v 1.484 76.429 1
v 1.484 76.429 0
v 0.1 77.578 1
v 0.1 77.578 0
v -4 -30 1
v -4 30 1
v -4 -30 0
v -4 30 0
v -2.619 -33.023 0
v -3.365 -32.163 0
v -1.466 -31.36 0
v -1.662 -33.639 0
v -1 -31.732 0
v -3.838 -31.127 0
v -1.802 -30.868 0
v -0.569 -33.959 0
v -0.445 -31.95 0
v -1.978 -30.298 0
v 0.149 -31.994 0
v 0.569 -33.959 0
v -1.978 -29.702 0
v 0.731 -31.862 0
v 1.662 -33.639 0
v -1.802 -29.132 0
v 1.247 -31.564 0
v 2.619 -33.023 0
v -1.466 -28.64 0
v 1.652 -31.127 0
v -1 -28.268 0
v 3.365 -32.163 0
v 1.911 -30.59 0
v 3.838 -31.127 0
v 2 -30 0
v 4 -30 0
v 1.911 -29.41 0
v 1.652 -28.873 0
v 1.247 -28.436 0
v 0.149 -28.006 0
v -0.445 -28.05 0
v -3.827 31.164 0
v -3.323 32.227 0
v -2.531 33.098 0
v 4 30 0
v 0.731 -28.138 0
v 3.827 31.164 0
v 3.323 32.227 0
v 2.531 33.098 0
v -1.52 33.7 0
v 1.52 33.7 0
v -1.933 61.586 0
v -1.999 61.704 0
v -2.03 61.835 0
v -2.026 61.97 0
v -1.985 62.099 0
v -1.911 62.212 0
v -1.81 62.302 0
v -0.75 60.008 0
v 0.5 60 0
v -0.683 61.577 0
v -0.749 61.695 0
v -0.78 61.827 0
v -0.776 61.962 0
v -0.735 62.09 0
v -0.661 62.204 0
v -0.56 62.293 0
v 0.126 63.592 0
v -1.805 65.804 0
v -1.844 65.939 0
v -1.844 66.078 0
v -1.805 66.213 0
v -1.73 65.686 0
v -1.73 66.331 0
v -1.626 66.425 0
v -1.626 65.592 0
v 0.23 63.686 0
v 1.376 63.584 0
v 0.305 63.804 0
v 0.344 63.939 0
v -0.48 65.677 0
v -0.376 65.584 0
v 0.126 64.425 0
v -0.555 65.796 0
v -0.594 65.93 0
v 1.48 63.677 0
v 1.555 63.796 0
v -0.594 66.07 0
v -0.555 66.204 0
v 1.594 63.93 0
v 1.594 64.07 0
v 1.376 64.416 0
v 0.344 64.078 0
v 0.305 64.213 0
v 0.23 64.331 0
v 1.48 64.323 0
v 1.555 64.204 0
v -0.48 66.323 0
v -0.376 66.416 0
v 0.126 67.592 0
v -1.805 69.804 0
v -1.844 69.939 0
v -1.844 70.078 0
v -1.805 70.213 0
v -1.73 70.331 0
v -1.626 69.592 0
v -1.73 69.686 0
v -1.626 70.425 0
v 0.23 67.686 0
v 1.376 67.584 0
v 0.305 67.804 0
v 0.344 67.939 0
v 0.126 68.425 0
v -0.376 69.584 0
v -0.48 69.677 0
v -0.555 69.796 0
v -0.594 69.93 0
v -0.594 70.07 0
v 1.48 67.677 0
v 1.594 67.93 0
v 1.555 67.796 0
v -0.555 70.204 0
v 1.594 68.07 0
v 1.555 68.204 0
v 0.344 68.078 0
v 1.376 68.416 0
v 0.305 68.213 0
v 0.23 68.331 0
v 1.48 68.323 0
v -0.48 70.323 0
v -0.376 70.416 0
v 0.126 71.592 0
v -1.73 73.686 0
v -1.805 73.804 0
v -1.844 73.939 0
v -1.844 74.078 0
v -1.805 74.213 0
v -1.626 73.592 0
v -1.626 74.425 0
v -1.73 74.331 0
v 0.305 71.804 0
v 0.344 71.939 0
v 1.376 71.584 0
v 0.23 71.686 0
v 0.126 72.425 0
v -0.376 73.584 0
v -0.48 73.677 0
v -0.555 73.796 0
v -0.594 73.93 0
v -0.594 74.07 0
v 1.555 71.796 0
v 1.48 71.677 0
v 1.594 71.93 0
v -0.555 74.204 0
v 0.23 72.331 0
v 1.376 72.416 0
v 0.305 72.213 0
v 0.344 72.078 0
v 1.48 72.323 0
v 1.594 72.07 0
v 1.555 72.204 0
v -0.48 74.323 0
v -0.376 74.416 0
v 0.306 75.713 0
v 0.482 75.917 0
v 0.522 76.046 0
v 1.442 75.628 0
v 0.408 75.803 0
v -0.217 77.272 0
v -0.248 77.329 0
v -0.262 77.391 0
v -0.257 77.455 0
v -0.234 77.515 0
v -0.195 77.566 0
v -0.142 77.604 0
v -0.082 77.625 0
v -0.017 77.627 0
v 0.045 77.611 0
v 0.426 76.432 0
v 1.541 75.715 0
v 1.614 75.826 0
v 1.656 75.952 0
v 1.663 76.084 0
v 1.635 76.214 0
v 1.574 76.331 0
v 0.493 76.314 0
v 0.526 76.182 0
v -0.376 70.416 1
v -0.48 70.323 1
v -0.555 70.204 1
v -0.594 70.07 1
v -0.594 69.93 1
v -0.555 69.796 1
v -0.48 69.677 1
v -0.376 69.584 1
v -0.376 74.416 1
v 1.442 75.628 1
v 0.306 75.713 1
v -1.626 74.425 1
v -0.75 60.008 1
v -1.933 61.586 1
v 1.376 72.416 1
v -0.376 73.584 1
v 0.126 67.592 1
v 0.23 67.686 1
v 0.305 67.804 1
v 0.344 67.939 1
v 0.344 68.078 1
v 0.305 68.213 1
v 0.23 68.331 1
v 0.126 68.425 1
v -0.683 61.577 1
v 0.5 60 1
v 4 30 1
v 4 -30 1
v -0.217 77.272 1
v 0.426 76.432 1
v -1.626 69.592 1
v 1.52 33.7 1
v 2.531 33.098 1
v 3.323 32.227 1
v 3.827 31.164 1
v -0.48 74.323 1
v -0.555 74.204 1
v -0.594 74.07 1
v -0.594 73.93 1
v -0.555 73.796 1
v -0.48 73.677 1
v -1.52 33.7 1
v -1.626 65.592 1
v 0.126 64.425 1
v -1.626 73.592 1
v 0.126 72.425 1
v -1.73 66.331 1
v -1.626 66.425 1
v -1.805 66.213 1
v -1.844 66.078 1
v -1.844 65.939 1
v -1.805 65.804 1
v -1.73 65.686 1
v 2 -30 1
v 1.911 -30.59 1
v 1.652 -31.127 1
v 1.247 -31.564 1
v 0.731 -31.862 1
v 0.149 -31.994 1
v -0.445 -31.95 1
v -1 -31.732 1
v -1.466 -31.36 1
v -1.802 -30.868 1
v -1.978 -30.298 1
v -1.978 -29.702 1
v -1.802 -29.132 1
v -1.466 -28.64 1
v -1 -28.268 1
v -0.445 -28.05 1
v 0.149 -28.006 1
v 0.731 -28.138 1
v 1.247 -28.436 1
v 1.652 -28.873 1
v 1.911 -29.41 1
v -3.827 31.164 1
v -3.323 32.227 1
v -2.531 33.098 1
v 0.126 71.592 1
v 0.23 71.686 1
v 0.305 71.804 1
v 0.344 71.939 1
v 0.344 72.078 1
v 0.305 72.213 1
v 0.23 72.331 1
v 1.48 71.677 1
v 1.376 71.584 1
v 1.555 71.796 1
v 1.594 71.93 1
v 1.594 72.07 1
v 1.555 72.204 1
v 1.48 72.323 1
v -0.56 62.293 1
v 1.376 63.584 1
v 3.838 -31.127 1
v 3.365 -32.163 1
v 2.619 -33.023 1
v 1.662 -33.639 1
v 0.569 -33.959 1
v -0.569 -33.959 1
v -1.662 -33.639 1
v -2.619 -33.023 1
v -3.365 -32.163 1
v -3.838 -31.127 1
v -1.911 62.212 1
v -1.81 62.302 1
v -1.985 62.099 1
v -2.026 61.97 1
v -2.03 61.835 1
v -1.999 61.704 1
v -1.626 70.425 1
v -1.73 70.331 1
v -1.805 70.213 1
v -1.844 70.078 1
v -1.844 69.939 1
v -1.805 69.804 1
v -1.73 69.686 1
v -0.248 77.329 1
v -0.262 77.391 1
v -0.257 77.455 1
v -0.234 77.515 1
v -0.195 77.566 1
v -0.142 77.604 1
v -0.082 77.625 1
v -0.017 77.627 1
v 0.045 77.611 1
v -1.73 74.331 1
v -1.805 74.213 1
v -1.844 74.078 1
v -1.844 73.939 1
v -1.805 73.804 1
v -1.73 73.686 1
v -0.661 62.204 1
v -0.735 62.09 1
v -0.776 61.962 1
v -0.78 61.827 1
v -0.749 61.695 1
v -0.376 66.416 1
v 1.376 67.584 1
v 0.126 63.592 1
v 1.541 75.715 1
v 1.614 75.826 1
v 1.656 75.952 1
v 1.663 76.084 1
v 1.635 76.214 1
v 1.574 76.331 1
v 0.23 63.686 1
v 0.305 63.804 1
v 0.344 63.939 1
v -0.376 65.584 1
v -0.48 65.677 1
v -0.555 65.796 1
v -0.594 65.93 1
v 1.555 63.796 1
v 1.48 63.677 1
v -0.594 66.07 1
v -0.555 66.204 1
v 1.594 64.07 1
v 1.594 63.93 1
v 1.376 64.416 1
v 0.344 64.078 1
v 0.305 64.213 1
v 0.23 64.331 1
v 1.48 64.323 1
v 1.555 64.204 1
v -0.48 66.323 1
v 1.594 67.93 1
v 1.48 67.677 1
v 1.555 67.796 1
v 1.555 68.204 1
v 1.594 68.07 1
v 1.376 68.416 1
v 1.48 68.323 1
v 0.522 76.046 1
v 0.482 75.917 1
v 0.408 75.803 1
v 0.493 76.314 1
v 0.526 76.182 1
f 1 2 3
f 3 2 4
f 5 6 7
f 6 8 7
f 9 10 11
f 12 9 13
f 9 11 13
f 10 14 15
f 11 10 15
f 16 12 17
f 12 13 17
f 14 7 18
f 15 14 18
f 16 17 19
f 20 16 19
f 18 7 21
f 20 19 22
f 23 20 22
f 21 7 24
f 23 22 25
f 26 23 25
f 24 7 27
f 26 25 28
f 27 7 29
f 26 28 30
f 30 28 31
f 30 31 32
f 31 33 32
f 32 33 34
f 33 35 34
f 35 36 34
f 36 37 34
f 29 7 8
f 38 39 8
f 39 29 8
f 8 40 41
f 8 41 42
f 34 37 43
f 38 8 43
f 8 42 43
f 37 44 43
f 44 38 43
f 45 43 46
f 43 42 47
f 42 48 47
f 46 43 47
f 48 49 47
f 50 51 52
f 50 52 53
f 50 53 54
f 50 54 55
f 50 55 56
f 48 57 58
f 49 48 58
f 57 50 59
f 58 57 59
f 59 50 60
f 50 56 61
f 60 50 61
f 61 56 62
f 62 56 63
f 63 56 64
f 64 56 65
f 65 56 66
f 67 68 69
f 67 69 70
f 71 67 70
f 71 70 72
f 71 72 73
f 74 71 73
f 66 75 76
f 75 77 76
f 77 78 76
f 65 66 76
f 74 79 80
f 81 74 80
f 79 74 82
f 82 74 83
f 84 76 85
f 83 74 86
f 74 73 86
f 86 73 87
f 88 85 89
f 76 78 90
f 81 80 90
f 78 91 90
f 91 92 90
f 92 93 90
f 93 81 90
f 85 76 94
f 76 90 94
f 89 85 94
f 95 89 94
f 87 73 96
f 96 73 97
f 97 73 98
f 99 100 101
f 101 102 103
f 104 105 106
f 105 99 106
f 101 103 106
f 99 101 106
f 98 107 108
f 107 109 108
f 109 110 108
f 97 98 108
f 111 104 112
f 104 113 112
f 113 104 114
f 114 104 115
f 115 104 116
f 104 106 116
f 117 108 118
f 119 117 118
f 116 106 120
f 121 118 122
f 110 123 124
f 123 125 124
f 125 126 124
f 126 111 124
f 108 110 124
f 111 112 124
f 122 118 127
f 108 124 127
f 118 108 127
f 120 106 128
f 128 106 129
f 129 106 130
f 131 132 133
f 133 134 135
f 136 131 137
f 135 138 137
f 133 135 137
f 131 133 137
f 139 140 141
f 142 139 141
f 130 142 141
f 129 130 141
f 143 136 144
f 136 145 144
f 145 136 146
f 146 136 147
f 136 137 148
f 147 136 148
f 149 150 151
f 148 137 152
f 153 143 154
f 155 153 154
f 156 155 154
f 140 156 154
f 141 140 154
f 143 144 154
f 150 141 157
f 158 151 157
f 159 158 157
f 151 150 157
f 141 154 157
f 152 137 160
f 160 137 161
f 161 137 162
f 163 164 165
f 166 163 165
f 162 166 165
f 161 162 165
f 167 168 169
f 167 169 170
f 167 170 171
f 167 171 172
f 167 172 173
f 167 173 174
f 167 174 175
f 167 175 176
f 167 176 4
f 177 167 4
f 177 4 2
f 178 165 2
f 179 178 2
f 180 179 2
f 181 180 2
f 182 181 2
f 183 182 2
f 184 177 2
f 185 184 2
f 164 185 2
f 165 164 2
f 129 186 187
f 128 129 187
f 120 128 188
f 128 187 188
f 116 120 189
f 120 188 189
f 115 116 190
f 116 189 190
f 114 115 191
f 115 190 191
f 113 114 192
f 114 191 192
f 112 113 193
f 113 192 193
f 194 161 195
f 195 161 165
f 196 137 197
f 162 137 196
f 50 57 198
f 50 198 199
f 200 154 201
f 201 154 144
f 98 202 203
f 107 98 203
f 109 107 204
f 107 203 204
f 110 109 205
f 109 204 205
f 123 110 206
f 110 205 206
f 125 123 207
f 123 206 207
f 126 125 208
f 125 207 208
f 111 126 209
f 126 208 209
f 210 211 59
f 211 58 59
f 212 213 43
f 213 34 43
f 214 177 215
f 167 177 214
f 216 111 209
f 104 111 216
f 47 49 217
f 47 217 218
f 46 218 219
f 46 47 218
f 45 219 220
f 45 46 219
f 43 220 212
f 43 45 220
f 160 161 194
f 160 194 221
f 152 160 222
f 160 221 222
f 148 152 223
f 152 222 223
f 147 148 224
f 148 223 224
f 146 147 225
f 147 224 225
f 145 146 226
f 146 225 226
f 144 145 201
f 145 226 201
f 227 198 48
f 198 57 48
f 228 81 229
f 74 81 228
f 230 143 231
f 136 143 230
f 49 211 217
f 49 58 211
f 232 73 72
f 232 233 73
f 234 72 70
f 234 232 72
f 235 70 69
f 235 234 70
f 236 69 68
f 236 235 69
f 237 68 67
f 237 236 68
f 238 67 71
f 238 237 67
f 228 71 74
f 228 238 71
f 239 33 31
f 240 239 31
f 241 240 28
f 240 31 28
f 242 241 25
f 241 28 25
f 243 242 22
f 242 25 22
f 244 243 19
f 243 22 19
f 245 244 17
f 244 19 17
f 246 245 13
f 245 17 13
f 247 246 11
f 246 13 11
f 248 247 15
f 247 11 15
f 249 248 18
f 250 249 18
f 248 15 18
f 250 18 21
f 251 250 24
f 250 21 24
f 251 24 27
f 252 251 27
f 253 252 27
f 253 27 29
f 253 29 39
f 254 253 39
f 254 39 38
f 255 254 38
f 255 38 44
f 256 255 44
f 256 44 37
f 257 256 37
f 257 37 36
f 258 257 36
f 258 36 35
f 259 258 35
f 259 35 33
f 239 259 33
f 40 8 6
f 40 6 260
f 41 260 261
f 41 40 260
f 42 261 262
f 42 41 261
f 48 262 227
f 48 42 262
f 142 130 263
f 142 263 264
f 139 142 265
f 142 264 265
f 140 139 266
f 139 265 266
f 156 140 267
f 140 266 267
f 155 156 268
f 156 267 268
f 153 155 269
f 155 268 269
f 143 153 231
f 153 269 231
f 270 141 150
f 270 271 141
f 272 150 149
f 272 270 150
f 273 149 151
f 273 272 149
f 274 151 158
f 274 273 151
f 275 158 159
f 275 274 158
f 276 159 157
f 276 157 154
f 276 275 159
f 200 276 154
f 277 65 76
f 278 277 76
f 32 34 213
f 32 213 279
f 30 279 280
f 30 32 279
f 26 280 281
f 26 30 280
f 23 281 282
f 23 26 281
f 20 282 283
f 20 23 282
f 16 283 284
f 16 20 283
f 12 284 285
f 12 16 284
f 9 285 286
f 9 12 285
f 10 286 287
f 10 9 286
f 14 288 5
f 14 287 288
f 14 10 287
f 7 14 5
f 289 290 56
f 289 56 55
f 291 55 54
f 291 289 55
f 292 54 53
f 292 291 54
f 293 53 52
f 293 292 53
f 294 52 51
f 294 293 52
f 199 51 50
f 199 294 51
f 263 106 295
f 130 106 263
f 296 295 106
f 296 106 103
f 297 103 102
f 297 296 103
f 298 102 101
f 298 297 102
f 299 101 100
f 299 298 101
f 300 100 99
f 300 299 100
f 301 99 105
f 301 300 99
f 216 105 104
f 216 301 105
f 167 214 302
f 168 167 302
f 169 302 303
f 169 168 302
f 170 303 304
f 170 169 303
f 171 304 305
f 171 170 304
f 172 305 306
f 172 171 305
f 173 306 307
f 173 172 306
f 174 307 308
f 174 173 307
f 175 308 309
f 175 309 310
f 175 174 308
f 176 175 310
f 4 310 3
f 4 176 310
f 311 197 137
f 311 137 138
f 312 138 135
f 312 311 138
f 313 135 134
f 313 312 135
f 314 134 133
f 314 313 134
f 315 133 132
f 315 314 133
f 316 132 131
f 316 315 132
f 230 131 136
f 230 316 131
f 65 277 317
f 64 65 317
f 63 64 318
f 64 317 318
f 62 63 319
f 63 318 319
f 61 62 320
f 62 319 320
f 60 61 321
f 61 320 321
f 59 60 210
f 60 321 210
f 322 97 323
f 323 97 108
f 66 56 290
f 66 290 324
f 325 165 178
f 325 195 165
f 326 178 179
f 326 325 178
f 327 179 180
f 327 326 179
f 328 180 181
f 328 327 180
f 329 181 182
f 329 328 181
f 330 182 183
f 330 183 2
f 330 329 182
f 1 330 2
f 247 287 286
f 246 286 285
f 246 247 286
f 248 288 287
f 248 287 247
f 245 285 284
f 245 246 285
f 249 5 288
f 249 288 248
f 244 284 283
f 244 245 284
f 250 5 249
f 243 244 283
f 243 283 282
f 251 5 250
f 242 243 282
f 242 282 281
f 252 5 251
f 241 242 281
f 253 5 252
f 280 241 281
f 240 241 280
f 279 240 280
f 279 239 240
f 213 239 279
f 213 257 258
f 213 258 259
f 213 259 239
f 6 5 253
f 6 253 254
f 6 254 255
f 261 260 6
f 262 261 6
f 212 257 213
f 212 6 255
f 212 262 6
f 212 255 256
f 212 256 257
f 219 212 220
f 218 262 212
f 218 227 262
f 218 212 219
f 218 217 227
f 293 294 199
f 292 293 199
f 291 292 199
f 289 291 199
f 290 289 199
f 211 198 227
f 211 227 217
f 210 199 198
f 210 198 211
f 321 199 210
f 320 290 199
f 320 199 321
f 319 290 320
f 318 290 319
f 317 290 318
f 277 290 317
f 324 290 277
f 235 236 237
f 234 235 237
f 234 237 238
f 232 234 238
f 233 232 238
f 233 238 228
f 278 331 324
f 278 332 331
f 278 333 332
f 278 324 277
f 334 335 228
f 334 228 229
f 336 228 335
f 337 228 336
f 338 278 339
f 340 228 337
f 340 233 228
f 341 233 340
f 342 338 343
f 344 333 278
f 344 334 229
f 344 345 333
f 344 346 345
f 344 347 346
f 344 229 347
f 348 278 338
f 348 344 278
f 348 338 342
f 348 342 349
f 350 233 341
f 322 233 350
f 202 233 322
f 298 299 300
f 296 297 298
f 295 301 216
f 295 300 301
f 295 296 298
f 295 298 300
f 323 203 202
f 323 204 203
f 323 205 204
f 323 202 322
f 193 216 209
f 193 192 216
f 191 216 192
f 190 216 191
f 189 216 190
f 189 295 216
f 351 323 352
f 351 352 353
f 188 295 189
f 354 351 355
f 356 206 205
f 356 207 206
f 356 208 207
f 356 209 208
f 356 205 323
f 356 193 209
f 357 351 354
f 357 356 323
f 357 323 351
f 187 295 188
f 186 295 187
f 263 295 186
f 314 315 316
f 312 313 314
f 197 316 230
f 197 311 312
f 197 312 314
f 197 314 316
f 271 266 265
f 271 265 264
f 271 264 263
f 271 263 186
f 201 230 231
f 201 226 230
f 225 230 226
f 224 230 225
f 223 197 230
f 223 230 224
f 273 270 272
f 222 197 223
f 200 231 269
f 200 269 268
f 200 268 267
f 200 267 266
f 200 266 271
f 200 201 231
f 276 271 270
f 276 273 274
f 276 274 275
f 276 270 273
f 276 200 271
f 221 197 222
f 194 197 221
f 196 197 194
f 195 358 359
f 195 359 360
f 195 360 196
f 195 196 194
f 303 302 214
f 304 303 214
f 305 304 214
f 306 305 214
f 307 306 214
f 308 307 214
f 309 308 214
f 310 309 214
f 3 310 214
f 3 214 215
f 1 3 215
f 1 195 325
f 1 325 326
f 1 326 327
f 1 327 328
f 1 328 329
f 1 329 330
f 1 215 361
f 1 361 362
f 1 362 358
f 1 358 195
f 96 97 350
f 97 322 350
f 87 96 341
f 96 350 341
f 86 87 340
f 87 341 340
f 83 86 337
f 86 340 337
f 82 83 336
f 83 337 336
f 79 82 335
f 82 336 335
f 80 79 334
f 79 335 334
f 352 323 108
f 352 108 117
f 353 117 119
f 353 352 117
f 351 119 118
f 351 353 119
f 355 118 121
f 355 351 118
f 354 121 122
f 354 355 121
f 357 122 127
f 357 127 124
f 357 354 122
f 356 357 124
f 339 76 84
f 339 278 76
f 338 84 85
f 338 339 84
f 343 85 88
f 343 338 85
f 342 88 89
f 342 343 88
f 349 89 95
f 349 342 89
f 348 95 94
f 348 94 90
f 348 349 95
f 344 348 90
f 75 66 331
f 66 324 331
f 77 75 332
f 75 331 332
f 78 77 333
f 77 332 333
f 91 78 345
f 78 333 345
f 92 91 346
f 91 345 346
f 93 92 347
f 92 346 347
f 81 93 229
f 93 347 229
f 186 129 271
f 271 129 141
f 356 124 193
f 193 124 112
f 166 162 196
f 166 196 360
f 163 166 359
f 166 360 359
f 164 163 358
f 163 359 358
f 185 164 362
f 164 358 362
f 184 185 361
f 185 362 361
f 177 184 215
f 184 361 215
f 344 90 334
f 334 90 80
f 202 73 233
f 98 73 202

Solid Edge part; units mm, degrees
sketch "Sketch1" plane through (0, 0, 0) normal (0, 0, 1) x (1, 0, 0)
  line L0 (4, -30) -> (4, 30)
  arc A0 (4, 30) -> (1.5199, 33.7) centre (0, 30) ccw
  line L1 (0.5, 60) -> (1.5199, 33.7)
  line L2 (0.5, 60) -> (-1, 62)
  line L3 (-1, 62) -> (2, 64)
  line L4 (2, 64) -> (-1, 66)
  line L5 (-1, 66) -> (2, 68)
  line L6 (2, 68) -> (-1, 70)
  line L7 (-1, 70) -> (2, 72)
  line L8 (2, 72) -> (-1, 74)
  line L9 (-1, 74) -> (2, 76)
  line L10 (2, 76) -> (0.0998, 77.5782)
  arc A1 (-0.2166, 77.2725) -> (0.0998, 77.5782) centre (-0.0407, 77.407) cw
  line L11 (0.75, 76.0085) -> (-0.2166, 77.2725)
  line L12 (-2.25, 74.0085) -> (0.75, 76.0085)
  line L13 (0.75, 72.0085) -> (-2.25, 74.0085)
  line L14 (-2.25, 70.0085) -> (0.75, 72.0085)
  line L15 (0.75, 68.0085) -> (-2.25, 70.0085)
  line L16 (-2.25, 66.0085) -> (0.75, 68.0085)
  line L17 (0.75, 64.0085) -> (-2.25, 66.0085)
  line L18 (-2.25, 62.0085) -> (0.75, 64.0085)
  line L19 (-0.75, 60.0085) -> (-2.25, 62.0085)
  line L20 (-0.75, 60.0085) -> (-1.5199, 33.7)
  arc A2 (-4, 30) -> (-1.5199, 33.7) centre (0, 30) cw
  line L21 (-4, 30) -> (-4, -30)
  arc A3 (-4, -30) -> (4, -30) centre (0, -30) ccw
  dimension "D1" = 4
  dimension "D2" = 0.5
extrude "Ajout_matière_1" add sketch "Sketch1" along normal blind 1
sketch "Sketch2" plane through (0, 0, 0) normal (0, 0, 1) x (1, 0, 0)
  circle A0 centre (0, -30) radius 2
  dimension "D1" = 4
extrude "Cutout1" cut sketch "Sketch2" along normal up to next
fillet "Congé_1" radius 0.5 8 edges at (-2.25, 62.0085, 0.5) (-2.25, 66.0085, 0.5) (-2.25, 70.0085, 0.5) (-2.25, 74.0085, 0.5) (2, 64, 0.5) (2, 68, 0.5) (2, 72, 0.5) (2, 76, 0.5)
fillet "Congé_2" radius 0.5 8 edges at (0.75, 64.0085, 0.5) (0.75, 72.0085, 0.5) (0.75, 68.0085, 0.5) (0.75, 76.0085, 0.5) (-1, 74, 0.5) (-1, 70, 0.5) (-1, 66, 0.5) (-1, 62, 0.5)
properties material "Acier S235"
